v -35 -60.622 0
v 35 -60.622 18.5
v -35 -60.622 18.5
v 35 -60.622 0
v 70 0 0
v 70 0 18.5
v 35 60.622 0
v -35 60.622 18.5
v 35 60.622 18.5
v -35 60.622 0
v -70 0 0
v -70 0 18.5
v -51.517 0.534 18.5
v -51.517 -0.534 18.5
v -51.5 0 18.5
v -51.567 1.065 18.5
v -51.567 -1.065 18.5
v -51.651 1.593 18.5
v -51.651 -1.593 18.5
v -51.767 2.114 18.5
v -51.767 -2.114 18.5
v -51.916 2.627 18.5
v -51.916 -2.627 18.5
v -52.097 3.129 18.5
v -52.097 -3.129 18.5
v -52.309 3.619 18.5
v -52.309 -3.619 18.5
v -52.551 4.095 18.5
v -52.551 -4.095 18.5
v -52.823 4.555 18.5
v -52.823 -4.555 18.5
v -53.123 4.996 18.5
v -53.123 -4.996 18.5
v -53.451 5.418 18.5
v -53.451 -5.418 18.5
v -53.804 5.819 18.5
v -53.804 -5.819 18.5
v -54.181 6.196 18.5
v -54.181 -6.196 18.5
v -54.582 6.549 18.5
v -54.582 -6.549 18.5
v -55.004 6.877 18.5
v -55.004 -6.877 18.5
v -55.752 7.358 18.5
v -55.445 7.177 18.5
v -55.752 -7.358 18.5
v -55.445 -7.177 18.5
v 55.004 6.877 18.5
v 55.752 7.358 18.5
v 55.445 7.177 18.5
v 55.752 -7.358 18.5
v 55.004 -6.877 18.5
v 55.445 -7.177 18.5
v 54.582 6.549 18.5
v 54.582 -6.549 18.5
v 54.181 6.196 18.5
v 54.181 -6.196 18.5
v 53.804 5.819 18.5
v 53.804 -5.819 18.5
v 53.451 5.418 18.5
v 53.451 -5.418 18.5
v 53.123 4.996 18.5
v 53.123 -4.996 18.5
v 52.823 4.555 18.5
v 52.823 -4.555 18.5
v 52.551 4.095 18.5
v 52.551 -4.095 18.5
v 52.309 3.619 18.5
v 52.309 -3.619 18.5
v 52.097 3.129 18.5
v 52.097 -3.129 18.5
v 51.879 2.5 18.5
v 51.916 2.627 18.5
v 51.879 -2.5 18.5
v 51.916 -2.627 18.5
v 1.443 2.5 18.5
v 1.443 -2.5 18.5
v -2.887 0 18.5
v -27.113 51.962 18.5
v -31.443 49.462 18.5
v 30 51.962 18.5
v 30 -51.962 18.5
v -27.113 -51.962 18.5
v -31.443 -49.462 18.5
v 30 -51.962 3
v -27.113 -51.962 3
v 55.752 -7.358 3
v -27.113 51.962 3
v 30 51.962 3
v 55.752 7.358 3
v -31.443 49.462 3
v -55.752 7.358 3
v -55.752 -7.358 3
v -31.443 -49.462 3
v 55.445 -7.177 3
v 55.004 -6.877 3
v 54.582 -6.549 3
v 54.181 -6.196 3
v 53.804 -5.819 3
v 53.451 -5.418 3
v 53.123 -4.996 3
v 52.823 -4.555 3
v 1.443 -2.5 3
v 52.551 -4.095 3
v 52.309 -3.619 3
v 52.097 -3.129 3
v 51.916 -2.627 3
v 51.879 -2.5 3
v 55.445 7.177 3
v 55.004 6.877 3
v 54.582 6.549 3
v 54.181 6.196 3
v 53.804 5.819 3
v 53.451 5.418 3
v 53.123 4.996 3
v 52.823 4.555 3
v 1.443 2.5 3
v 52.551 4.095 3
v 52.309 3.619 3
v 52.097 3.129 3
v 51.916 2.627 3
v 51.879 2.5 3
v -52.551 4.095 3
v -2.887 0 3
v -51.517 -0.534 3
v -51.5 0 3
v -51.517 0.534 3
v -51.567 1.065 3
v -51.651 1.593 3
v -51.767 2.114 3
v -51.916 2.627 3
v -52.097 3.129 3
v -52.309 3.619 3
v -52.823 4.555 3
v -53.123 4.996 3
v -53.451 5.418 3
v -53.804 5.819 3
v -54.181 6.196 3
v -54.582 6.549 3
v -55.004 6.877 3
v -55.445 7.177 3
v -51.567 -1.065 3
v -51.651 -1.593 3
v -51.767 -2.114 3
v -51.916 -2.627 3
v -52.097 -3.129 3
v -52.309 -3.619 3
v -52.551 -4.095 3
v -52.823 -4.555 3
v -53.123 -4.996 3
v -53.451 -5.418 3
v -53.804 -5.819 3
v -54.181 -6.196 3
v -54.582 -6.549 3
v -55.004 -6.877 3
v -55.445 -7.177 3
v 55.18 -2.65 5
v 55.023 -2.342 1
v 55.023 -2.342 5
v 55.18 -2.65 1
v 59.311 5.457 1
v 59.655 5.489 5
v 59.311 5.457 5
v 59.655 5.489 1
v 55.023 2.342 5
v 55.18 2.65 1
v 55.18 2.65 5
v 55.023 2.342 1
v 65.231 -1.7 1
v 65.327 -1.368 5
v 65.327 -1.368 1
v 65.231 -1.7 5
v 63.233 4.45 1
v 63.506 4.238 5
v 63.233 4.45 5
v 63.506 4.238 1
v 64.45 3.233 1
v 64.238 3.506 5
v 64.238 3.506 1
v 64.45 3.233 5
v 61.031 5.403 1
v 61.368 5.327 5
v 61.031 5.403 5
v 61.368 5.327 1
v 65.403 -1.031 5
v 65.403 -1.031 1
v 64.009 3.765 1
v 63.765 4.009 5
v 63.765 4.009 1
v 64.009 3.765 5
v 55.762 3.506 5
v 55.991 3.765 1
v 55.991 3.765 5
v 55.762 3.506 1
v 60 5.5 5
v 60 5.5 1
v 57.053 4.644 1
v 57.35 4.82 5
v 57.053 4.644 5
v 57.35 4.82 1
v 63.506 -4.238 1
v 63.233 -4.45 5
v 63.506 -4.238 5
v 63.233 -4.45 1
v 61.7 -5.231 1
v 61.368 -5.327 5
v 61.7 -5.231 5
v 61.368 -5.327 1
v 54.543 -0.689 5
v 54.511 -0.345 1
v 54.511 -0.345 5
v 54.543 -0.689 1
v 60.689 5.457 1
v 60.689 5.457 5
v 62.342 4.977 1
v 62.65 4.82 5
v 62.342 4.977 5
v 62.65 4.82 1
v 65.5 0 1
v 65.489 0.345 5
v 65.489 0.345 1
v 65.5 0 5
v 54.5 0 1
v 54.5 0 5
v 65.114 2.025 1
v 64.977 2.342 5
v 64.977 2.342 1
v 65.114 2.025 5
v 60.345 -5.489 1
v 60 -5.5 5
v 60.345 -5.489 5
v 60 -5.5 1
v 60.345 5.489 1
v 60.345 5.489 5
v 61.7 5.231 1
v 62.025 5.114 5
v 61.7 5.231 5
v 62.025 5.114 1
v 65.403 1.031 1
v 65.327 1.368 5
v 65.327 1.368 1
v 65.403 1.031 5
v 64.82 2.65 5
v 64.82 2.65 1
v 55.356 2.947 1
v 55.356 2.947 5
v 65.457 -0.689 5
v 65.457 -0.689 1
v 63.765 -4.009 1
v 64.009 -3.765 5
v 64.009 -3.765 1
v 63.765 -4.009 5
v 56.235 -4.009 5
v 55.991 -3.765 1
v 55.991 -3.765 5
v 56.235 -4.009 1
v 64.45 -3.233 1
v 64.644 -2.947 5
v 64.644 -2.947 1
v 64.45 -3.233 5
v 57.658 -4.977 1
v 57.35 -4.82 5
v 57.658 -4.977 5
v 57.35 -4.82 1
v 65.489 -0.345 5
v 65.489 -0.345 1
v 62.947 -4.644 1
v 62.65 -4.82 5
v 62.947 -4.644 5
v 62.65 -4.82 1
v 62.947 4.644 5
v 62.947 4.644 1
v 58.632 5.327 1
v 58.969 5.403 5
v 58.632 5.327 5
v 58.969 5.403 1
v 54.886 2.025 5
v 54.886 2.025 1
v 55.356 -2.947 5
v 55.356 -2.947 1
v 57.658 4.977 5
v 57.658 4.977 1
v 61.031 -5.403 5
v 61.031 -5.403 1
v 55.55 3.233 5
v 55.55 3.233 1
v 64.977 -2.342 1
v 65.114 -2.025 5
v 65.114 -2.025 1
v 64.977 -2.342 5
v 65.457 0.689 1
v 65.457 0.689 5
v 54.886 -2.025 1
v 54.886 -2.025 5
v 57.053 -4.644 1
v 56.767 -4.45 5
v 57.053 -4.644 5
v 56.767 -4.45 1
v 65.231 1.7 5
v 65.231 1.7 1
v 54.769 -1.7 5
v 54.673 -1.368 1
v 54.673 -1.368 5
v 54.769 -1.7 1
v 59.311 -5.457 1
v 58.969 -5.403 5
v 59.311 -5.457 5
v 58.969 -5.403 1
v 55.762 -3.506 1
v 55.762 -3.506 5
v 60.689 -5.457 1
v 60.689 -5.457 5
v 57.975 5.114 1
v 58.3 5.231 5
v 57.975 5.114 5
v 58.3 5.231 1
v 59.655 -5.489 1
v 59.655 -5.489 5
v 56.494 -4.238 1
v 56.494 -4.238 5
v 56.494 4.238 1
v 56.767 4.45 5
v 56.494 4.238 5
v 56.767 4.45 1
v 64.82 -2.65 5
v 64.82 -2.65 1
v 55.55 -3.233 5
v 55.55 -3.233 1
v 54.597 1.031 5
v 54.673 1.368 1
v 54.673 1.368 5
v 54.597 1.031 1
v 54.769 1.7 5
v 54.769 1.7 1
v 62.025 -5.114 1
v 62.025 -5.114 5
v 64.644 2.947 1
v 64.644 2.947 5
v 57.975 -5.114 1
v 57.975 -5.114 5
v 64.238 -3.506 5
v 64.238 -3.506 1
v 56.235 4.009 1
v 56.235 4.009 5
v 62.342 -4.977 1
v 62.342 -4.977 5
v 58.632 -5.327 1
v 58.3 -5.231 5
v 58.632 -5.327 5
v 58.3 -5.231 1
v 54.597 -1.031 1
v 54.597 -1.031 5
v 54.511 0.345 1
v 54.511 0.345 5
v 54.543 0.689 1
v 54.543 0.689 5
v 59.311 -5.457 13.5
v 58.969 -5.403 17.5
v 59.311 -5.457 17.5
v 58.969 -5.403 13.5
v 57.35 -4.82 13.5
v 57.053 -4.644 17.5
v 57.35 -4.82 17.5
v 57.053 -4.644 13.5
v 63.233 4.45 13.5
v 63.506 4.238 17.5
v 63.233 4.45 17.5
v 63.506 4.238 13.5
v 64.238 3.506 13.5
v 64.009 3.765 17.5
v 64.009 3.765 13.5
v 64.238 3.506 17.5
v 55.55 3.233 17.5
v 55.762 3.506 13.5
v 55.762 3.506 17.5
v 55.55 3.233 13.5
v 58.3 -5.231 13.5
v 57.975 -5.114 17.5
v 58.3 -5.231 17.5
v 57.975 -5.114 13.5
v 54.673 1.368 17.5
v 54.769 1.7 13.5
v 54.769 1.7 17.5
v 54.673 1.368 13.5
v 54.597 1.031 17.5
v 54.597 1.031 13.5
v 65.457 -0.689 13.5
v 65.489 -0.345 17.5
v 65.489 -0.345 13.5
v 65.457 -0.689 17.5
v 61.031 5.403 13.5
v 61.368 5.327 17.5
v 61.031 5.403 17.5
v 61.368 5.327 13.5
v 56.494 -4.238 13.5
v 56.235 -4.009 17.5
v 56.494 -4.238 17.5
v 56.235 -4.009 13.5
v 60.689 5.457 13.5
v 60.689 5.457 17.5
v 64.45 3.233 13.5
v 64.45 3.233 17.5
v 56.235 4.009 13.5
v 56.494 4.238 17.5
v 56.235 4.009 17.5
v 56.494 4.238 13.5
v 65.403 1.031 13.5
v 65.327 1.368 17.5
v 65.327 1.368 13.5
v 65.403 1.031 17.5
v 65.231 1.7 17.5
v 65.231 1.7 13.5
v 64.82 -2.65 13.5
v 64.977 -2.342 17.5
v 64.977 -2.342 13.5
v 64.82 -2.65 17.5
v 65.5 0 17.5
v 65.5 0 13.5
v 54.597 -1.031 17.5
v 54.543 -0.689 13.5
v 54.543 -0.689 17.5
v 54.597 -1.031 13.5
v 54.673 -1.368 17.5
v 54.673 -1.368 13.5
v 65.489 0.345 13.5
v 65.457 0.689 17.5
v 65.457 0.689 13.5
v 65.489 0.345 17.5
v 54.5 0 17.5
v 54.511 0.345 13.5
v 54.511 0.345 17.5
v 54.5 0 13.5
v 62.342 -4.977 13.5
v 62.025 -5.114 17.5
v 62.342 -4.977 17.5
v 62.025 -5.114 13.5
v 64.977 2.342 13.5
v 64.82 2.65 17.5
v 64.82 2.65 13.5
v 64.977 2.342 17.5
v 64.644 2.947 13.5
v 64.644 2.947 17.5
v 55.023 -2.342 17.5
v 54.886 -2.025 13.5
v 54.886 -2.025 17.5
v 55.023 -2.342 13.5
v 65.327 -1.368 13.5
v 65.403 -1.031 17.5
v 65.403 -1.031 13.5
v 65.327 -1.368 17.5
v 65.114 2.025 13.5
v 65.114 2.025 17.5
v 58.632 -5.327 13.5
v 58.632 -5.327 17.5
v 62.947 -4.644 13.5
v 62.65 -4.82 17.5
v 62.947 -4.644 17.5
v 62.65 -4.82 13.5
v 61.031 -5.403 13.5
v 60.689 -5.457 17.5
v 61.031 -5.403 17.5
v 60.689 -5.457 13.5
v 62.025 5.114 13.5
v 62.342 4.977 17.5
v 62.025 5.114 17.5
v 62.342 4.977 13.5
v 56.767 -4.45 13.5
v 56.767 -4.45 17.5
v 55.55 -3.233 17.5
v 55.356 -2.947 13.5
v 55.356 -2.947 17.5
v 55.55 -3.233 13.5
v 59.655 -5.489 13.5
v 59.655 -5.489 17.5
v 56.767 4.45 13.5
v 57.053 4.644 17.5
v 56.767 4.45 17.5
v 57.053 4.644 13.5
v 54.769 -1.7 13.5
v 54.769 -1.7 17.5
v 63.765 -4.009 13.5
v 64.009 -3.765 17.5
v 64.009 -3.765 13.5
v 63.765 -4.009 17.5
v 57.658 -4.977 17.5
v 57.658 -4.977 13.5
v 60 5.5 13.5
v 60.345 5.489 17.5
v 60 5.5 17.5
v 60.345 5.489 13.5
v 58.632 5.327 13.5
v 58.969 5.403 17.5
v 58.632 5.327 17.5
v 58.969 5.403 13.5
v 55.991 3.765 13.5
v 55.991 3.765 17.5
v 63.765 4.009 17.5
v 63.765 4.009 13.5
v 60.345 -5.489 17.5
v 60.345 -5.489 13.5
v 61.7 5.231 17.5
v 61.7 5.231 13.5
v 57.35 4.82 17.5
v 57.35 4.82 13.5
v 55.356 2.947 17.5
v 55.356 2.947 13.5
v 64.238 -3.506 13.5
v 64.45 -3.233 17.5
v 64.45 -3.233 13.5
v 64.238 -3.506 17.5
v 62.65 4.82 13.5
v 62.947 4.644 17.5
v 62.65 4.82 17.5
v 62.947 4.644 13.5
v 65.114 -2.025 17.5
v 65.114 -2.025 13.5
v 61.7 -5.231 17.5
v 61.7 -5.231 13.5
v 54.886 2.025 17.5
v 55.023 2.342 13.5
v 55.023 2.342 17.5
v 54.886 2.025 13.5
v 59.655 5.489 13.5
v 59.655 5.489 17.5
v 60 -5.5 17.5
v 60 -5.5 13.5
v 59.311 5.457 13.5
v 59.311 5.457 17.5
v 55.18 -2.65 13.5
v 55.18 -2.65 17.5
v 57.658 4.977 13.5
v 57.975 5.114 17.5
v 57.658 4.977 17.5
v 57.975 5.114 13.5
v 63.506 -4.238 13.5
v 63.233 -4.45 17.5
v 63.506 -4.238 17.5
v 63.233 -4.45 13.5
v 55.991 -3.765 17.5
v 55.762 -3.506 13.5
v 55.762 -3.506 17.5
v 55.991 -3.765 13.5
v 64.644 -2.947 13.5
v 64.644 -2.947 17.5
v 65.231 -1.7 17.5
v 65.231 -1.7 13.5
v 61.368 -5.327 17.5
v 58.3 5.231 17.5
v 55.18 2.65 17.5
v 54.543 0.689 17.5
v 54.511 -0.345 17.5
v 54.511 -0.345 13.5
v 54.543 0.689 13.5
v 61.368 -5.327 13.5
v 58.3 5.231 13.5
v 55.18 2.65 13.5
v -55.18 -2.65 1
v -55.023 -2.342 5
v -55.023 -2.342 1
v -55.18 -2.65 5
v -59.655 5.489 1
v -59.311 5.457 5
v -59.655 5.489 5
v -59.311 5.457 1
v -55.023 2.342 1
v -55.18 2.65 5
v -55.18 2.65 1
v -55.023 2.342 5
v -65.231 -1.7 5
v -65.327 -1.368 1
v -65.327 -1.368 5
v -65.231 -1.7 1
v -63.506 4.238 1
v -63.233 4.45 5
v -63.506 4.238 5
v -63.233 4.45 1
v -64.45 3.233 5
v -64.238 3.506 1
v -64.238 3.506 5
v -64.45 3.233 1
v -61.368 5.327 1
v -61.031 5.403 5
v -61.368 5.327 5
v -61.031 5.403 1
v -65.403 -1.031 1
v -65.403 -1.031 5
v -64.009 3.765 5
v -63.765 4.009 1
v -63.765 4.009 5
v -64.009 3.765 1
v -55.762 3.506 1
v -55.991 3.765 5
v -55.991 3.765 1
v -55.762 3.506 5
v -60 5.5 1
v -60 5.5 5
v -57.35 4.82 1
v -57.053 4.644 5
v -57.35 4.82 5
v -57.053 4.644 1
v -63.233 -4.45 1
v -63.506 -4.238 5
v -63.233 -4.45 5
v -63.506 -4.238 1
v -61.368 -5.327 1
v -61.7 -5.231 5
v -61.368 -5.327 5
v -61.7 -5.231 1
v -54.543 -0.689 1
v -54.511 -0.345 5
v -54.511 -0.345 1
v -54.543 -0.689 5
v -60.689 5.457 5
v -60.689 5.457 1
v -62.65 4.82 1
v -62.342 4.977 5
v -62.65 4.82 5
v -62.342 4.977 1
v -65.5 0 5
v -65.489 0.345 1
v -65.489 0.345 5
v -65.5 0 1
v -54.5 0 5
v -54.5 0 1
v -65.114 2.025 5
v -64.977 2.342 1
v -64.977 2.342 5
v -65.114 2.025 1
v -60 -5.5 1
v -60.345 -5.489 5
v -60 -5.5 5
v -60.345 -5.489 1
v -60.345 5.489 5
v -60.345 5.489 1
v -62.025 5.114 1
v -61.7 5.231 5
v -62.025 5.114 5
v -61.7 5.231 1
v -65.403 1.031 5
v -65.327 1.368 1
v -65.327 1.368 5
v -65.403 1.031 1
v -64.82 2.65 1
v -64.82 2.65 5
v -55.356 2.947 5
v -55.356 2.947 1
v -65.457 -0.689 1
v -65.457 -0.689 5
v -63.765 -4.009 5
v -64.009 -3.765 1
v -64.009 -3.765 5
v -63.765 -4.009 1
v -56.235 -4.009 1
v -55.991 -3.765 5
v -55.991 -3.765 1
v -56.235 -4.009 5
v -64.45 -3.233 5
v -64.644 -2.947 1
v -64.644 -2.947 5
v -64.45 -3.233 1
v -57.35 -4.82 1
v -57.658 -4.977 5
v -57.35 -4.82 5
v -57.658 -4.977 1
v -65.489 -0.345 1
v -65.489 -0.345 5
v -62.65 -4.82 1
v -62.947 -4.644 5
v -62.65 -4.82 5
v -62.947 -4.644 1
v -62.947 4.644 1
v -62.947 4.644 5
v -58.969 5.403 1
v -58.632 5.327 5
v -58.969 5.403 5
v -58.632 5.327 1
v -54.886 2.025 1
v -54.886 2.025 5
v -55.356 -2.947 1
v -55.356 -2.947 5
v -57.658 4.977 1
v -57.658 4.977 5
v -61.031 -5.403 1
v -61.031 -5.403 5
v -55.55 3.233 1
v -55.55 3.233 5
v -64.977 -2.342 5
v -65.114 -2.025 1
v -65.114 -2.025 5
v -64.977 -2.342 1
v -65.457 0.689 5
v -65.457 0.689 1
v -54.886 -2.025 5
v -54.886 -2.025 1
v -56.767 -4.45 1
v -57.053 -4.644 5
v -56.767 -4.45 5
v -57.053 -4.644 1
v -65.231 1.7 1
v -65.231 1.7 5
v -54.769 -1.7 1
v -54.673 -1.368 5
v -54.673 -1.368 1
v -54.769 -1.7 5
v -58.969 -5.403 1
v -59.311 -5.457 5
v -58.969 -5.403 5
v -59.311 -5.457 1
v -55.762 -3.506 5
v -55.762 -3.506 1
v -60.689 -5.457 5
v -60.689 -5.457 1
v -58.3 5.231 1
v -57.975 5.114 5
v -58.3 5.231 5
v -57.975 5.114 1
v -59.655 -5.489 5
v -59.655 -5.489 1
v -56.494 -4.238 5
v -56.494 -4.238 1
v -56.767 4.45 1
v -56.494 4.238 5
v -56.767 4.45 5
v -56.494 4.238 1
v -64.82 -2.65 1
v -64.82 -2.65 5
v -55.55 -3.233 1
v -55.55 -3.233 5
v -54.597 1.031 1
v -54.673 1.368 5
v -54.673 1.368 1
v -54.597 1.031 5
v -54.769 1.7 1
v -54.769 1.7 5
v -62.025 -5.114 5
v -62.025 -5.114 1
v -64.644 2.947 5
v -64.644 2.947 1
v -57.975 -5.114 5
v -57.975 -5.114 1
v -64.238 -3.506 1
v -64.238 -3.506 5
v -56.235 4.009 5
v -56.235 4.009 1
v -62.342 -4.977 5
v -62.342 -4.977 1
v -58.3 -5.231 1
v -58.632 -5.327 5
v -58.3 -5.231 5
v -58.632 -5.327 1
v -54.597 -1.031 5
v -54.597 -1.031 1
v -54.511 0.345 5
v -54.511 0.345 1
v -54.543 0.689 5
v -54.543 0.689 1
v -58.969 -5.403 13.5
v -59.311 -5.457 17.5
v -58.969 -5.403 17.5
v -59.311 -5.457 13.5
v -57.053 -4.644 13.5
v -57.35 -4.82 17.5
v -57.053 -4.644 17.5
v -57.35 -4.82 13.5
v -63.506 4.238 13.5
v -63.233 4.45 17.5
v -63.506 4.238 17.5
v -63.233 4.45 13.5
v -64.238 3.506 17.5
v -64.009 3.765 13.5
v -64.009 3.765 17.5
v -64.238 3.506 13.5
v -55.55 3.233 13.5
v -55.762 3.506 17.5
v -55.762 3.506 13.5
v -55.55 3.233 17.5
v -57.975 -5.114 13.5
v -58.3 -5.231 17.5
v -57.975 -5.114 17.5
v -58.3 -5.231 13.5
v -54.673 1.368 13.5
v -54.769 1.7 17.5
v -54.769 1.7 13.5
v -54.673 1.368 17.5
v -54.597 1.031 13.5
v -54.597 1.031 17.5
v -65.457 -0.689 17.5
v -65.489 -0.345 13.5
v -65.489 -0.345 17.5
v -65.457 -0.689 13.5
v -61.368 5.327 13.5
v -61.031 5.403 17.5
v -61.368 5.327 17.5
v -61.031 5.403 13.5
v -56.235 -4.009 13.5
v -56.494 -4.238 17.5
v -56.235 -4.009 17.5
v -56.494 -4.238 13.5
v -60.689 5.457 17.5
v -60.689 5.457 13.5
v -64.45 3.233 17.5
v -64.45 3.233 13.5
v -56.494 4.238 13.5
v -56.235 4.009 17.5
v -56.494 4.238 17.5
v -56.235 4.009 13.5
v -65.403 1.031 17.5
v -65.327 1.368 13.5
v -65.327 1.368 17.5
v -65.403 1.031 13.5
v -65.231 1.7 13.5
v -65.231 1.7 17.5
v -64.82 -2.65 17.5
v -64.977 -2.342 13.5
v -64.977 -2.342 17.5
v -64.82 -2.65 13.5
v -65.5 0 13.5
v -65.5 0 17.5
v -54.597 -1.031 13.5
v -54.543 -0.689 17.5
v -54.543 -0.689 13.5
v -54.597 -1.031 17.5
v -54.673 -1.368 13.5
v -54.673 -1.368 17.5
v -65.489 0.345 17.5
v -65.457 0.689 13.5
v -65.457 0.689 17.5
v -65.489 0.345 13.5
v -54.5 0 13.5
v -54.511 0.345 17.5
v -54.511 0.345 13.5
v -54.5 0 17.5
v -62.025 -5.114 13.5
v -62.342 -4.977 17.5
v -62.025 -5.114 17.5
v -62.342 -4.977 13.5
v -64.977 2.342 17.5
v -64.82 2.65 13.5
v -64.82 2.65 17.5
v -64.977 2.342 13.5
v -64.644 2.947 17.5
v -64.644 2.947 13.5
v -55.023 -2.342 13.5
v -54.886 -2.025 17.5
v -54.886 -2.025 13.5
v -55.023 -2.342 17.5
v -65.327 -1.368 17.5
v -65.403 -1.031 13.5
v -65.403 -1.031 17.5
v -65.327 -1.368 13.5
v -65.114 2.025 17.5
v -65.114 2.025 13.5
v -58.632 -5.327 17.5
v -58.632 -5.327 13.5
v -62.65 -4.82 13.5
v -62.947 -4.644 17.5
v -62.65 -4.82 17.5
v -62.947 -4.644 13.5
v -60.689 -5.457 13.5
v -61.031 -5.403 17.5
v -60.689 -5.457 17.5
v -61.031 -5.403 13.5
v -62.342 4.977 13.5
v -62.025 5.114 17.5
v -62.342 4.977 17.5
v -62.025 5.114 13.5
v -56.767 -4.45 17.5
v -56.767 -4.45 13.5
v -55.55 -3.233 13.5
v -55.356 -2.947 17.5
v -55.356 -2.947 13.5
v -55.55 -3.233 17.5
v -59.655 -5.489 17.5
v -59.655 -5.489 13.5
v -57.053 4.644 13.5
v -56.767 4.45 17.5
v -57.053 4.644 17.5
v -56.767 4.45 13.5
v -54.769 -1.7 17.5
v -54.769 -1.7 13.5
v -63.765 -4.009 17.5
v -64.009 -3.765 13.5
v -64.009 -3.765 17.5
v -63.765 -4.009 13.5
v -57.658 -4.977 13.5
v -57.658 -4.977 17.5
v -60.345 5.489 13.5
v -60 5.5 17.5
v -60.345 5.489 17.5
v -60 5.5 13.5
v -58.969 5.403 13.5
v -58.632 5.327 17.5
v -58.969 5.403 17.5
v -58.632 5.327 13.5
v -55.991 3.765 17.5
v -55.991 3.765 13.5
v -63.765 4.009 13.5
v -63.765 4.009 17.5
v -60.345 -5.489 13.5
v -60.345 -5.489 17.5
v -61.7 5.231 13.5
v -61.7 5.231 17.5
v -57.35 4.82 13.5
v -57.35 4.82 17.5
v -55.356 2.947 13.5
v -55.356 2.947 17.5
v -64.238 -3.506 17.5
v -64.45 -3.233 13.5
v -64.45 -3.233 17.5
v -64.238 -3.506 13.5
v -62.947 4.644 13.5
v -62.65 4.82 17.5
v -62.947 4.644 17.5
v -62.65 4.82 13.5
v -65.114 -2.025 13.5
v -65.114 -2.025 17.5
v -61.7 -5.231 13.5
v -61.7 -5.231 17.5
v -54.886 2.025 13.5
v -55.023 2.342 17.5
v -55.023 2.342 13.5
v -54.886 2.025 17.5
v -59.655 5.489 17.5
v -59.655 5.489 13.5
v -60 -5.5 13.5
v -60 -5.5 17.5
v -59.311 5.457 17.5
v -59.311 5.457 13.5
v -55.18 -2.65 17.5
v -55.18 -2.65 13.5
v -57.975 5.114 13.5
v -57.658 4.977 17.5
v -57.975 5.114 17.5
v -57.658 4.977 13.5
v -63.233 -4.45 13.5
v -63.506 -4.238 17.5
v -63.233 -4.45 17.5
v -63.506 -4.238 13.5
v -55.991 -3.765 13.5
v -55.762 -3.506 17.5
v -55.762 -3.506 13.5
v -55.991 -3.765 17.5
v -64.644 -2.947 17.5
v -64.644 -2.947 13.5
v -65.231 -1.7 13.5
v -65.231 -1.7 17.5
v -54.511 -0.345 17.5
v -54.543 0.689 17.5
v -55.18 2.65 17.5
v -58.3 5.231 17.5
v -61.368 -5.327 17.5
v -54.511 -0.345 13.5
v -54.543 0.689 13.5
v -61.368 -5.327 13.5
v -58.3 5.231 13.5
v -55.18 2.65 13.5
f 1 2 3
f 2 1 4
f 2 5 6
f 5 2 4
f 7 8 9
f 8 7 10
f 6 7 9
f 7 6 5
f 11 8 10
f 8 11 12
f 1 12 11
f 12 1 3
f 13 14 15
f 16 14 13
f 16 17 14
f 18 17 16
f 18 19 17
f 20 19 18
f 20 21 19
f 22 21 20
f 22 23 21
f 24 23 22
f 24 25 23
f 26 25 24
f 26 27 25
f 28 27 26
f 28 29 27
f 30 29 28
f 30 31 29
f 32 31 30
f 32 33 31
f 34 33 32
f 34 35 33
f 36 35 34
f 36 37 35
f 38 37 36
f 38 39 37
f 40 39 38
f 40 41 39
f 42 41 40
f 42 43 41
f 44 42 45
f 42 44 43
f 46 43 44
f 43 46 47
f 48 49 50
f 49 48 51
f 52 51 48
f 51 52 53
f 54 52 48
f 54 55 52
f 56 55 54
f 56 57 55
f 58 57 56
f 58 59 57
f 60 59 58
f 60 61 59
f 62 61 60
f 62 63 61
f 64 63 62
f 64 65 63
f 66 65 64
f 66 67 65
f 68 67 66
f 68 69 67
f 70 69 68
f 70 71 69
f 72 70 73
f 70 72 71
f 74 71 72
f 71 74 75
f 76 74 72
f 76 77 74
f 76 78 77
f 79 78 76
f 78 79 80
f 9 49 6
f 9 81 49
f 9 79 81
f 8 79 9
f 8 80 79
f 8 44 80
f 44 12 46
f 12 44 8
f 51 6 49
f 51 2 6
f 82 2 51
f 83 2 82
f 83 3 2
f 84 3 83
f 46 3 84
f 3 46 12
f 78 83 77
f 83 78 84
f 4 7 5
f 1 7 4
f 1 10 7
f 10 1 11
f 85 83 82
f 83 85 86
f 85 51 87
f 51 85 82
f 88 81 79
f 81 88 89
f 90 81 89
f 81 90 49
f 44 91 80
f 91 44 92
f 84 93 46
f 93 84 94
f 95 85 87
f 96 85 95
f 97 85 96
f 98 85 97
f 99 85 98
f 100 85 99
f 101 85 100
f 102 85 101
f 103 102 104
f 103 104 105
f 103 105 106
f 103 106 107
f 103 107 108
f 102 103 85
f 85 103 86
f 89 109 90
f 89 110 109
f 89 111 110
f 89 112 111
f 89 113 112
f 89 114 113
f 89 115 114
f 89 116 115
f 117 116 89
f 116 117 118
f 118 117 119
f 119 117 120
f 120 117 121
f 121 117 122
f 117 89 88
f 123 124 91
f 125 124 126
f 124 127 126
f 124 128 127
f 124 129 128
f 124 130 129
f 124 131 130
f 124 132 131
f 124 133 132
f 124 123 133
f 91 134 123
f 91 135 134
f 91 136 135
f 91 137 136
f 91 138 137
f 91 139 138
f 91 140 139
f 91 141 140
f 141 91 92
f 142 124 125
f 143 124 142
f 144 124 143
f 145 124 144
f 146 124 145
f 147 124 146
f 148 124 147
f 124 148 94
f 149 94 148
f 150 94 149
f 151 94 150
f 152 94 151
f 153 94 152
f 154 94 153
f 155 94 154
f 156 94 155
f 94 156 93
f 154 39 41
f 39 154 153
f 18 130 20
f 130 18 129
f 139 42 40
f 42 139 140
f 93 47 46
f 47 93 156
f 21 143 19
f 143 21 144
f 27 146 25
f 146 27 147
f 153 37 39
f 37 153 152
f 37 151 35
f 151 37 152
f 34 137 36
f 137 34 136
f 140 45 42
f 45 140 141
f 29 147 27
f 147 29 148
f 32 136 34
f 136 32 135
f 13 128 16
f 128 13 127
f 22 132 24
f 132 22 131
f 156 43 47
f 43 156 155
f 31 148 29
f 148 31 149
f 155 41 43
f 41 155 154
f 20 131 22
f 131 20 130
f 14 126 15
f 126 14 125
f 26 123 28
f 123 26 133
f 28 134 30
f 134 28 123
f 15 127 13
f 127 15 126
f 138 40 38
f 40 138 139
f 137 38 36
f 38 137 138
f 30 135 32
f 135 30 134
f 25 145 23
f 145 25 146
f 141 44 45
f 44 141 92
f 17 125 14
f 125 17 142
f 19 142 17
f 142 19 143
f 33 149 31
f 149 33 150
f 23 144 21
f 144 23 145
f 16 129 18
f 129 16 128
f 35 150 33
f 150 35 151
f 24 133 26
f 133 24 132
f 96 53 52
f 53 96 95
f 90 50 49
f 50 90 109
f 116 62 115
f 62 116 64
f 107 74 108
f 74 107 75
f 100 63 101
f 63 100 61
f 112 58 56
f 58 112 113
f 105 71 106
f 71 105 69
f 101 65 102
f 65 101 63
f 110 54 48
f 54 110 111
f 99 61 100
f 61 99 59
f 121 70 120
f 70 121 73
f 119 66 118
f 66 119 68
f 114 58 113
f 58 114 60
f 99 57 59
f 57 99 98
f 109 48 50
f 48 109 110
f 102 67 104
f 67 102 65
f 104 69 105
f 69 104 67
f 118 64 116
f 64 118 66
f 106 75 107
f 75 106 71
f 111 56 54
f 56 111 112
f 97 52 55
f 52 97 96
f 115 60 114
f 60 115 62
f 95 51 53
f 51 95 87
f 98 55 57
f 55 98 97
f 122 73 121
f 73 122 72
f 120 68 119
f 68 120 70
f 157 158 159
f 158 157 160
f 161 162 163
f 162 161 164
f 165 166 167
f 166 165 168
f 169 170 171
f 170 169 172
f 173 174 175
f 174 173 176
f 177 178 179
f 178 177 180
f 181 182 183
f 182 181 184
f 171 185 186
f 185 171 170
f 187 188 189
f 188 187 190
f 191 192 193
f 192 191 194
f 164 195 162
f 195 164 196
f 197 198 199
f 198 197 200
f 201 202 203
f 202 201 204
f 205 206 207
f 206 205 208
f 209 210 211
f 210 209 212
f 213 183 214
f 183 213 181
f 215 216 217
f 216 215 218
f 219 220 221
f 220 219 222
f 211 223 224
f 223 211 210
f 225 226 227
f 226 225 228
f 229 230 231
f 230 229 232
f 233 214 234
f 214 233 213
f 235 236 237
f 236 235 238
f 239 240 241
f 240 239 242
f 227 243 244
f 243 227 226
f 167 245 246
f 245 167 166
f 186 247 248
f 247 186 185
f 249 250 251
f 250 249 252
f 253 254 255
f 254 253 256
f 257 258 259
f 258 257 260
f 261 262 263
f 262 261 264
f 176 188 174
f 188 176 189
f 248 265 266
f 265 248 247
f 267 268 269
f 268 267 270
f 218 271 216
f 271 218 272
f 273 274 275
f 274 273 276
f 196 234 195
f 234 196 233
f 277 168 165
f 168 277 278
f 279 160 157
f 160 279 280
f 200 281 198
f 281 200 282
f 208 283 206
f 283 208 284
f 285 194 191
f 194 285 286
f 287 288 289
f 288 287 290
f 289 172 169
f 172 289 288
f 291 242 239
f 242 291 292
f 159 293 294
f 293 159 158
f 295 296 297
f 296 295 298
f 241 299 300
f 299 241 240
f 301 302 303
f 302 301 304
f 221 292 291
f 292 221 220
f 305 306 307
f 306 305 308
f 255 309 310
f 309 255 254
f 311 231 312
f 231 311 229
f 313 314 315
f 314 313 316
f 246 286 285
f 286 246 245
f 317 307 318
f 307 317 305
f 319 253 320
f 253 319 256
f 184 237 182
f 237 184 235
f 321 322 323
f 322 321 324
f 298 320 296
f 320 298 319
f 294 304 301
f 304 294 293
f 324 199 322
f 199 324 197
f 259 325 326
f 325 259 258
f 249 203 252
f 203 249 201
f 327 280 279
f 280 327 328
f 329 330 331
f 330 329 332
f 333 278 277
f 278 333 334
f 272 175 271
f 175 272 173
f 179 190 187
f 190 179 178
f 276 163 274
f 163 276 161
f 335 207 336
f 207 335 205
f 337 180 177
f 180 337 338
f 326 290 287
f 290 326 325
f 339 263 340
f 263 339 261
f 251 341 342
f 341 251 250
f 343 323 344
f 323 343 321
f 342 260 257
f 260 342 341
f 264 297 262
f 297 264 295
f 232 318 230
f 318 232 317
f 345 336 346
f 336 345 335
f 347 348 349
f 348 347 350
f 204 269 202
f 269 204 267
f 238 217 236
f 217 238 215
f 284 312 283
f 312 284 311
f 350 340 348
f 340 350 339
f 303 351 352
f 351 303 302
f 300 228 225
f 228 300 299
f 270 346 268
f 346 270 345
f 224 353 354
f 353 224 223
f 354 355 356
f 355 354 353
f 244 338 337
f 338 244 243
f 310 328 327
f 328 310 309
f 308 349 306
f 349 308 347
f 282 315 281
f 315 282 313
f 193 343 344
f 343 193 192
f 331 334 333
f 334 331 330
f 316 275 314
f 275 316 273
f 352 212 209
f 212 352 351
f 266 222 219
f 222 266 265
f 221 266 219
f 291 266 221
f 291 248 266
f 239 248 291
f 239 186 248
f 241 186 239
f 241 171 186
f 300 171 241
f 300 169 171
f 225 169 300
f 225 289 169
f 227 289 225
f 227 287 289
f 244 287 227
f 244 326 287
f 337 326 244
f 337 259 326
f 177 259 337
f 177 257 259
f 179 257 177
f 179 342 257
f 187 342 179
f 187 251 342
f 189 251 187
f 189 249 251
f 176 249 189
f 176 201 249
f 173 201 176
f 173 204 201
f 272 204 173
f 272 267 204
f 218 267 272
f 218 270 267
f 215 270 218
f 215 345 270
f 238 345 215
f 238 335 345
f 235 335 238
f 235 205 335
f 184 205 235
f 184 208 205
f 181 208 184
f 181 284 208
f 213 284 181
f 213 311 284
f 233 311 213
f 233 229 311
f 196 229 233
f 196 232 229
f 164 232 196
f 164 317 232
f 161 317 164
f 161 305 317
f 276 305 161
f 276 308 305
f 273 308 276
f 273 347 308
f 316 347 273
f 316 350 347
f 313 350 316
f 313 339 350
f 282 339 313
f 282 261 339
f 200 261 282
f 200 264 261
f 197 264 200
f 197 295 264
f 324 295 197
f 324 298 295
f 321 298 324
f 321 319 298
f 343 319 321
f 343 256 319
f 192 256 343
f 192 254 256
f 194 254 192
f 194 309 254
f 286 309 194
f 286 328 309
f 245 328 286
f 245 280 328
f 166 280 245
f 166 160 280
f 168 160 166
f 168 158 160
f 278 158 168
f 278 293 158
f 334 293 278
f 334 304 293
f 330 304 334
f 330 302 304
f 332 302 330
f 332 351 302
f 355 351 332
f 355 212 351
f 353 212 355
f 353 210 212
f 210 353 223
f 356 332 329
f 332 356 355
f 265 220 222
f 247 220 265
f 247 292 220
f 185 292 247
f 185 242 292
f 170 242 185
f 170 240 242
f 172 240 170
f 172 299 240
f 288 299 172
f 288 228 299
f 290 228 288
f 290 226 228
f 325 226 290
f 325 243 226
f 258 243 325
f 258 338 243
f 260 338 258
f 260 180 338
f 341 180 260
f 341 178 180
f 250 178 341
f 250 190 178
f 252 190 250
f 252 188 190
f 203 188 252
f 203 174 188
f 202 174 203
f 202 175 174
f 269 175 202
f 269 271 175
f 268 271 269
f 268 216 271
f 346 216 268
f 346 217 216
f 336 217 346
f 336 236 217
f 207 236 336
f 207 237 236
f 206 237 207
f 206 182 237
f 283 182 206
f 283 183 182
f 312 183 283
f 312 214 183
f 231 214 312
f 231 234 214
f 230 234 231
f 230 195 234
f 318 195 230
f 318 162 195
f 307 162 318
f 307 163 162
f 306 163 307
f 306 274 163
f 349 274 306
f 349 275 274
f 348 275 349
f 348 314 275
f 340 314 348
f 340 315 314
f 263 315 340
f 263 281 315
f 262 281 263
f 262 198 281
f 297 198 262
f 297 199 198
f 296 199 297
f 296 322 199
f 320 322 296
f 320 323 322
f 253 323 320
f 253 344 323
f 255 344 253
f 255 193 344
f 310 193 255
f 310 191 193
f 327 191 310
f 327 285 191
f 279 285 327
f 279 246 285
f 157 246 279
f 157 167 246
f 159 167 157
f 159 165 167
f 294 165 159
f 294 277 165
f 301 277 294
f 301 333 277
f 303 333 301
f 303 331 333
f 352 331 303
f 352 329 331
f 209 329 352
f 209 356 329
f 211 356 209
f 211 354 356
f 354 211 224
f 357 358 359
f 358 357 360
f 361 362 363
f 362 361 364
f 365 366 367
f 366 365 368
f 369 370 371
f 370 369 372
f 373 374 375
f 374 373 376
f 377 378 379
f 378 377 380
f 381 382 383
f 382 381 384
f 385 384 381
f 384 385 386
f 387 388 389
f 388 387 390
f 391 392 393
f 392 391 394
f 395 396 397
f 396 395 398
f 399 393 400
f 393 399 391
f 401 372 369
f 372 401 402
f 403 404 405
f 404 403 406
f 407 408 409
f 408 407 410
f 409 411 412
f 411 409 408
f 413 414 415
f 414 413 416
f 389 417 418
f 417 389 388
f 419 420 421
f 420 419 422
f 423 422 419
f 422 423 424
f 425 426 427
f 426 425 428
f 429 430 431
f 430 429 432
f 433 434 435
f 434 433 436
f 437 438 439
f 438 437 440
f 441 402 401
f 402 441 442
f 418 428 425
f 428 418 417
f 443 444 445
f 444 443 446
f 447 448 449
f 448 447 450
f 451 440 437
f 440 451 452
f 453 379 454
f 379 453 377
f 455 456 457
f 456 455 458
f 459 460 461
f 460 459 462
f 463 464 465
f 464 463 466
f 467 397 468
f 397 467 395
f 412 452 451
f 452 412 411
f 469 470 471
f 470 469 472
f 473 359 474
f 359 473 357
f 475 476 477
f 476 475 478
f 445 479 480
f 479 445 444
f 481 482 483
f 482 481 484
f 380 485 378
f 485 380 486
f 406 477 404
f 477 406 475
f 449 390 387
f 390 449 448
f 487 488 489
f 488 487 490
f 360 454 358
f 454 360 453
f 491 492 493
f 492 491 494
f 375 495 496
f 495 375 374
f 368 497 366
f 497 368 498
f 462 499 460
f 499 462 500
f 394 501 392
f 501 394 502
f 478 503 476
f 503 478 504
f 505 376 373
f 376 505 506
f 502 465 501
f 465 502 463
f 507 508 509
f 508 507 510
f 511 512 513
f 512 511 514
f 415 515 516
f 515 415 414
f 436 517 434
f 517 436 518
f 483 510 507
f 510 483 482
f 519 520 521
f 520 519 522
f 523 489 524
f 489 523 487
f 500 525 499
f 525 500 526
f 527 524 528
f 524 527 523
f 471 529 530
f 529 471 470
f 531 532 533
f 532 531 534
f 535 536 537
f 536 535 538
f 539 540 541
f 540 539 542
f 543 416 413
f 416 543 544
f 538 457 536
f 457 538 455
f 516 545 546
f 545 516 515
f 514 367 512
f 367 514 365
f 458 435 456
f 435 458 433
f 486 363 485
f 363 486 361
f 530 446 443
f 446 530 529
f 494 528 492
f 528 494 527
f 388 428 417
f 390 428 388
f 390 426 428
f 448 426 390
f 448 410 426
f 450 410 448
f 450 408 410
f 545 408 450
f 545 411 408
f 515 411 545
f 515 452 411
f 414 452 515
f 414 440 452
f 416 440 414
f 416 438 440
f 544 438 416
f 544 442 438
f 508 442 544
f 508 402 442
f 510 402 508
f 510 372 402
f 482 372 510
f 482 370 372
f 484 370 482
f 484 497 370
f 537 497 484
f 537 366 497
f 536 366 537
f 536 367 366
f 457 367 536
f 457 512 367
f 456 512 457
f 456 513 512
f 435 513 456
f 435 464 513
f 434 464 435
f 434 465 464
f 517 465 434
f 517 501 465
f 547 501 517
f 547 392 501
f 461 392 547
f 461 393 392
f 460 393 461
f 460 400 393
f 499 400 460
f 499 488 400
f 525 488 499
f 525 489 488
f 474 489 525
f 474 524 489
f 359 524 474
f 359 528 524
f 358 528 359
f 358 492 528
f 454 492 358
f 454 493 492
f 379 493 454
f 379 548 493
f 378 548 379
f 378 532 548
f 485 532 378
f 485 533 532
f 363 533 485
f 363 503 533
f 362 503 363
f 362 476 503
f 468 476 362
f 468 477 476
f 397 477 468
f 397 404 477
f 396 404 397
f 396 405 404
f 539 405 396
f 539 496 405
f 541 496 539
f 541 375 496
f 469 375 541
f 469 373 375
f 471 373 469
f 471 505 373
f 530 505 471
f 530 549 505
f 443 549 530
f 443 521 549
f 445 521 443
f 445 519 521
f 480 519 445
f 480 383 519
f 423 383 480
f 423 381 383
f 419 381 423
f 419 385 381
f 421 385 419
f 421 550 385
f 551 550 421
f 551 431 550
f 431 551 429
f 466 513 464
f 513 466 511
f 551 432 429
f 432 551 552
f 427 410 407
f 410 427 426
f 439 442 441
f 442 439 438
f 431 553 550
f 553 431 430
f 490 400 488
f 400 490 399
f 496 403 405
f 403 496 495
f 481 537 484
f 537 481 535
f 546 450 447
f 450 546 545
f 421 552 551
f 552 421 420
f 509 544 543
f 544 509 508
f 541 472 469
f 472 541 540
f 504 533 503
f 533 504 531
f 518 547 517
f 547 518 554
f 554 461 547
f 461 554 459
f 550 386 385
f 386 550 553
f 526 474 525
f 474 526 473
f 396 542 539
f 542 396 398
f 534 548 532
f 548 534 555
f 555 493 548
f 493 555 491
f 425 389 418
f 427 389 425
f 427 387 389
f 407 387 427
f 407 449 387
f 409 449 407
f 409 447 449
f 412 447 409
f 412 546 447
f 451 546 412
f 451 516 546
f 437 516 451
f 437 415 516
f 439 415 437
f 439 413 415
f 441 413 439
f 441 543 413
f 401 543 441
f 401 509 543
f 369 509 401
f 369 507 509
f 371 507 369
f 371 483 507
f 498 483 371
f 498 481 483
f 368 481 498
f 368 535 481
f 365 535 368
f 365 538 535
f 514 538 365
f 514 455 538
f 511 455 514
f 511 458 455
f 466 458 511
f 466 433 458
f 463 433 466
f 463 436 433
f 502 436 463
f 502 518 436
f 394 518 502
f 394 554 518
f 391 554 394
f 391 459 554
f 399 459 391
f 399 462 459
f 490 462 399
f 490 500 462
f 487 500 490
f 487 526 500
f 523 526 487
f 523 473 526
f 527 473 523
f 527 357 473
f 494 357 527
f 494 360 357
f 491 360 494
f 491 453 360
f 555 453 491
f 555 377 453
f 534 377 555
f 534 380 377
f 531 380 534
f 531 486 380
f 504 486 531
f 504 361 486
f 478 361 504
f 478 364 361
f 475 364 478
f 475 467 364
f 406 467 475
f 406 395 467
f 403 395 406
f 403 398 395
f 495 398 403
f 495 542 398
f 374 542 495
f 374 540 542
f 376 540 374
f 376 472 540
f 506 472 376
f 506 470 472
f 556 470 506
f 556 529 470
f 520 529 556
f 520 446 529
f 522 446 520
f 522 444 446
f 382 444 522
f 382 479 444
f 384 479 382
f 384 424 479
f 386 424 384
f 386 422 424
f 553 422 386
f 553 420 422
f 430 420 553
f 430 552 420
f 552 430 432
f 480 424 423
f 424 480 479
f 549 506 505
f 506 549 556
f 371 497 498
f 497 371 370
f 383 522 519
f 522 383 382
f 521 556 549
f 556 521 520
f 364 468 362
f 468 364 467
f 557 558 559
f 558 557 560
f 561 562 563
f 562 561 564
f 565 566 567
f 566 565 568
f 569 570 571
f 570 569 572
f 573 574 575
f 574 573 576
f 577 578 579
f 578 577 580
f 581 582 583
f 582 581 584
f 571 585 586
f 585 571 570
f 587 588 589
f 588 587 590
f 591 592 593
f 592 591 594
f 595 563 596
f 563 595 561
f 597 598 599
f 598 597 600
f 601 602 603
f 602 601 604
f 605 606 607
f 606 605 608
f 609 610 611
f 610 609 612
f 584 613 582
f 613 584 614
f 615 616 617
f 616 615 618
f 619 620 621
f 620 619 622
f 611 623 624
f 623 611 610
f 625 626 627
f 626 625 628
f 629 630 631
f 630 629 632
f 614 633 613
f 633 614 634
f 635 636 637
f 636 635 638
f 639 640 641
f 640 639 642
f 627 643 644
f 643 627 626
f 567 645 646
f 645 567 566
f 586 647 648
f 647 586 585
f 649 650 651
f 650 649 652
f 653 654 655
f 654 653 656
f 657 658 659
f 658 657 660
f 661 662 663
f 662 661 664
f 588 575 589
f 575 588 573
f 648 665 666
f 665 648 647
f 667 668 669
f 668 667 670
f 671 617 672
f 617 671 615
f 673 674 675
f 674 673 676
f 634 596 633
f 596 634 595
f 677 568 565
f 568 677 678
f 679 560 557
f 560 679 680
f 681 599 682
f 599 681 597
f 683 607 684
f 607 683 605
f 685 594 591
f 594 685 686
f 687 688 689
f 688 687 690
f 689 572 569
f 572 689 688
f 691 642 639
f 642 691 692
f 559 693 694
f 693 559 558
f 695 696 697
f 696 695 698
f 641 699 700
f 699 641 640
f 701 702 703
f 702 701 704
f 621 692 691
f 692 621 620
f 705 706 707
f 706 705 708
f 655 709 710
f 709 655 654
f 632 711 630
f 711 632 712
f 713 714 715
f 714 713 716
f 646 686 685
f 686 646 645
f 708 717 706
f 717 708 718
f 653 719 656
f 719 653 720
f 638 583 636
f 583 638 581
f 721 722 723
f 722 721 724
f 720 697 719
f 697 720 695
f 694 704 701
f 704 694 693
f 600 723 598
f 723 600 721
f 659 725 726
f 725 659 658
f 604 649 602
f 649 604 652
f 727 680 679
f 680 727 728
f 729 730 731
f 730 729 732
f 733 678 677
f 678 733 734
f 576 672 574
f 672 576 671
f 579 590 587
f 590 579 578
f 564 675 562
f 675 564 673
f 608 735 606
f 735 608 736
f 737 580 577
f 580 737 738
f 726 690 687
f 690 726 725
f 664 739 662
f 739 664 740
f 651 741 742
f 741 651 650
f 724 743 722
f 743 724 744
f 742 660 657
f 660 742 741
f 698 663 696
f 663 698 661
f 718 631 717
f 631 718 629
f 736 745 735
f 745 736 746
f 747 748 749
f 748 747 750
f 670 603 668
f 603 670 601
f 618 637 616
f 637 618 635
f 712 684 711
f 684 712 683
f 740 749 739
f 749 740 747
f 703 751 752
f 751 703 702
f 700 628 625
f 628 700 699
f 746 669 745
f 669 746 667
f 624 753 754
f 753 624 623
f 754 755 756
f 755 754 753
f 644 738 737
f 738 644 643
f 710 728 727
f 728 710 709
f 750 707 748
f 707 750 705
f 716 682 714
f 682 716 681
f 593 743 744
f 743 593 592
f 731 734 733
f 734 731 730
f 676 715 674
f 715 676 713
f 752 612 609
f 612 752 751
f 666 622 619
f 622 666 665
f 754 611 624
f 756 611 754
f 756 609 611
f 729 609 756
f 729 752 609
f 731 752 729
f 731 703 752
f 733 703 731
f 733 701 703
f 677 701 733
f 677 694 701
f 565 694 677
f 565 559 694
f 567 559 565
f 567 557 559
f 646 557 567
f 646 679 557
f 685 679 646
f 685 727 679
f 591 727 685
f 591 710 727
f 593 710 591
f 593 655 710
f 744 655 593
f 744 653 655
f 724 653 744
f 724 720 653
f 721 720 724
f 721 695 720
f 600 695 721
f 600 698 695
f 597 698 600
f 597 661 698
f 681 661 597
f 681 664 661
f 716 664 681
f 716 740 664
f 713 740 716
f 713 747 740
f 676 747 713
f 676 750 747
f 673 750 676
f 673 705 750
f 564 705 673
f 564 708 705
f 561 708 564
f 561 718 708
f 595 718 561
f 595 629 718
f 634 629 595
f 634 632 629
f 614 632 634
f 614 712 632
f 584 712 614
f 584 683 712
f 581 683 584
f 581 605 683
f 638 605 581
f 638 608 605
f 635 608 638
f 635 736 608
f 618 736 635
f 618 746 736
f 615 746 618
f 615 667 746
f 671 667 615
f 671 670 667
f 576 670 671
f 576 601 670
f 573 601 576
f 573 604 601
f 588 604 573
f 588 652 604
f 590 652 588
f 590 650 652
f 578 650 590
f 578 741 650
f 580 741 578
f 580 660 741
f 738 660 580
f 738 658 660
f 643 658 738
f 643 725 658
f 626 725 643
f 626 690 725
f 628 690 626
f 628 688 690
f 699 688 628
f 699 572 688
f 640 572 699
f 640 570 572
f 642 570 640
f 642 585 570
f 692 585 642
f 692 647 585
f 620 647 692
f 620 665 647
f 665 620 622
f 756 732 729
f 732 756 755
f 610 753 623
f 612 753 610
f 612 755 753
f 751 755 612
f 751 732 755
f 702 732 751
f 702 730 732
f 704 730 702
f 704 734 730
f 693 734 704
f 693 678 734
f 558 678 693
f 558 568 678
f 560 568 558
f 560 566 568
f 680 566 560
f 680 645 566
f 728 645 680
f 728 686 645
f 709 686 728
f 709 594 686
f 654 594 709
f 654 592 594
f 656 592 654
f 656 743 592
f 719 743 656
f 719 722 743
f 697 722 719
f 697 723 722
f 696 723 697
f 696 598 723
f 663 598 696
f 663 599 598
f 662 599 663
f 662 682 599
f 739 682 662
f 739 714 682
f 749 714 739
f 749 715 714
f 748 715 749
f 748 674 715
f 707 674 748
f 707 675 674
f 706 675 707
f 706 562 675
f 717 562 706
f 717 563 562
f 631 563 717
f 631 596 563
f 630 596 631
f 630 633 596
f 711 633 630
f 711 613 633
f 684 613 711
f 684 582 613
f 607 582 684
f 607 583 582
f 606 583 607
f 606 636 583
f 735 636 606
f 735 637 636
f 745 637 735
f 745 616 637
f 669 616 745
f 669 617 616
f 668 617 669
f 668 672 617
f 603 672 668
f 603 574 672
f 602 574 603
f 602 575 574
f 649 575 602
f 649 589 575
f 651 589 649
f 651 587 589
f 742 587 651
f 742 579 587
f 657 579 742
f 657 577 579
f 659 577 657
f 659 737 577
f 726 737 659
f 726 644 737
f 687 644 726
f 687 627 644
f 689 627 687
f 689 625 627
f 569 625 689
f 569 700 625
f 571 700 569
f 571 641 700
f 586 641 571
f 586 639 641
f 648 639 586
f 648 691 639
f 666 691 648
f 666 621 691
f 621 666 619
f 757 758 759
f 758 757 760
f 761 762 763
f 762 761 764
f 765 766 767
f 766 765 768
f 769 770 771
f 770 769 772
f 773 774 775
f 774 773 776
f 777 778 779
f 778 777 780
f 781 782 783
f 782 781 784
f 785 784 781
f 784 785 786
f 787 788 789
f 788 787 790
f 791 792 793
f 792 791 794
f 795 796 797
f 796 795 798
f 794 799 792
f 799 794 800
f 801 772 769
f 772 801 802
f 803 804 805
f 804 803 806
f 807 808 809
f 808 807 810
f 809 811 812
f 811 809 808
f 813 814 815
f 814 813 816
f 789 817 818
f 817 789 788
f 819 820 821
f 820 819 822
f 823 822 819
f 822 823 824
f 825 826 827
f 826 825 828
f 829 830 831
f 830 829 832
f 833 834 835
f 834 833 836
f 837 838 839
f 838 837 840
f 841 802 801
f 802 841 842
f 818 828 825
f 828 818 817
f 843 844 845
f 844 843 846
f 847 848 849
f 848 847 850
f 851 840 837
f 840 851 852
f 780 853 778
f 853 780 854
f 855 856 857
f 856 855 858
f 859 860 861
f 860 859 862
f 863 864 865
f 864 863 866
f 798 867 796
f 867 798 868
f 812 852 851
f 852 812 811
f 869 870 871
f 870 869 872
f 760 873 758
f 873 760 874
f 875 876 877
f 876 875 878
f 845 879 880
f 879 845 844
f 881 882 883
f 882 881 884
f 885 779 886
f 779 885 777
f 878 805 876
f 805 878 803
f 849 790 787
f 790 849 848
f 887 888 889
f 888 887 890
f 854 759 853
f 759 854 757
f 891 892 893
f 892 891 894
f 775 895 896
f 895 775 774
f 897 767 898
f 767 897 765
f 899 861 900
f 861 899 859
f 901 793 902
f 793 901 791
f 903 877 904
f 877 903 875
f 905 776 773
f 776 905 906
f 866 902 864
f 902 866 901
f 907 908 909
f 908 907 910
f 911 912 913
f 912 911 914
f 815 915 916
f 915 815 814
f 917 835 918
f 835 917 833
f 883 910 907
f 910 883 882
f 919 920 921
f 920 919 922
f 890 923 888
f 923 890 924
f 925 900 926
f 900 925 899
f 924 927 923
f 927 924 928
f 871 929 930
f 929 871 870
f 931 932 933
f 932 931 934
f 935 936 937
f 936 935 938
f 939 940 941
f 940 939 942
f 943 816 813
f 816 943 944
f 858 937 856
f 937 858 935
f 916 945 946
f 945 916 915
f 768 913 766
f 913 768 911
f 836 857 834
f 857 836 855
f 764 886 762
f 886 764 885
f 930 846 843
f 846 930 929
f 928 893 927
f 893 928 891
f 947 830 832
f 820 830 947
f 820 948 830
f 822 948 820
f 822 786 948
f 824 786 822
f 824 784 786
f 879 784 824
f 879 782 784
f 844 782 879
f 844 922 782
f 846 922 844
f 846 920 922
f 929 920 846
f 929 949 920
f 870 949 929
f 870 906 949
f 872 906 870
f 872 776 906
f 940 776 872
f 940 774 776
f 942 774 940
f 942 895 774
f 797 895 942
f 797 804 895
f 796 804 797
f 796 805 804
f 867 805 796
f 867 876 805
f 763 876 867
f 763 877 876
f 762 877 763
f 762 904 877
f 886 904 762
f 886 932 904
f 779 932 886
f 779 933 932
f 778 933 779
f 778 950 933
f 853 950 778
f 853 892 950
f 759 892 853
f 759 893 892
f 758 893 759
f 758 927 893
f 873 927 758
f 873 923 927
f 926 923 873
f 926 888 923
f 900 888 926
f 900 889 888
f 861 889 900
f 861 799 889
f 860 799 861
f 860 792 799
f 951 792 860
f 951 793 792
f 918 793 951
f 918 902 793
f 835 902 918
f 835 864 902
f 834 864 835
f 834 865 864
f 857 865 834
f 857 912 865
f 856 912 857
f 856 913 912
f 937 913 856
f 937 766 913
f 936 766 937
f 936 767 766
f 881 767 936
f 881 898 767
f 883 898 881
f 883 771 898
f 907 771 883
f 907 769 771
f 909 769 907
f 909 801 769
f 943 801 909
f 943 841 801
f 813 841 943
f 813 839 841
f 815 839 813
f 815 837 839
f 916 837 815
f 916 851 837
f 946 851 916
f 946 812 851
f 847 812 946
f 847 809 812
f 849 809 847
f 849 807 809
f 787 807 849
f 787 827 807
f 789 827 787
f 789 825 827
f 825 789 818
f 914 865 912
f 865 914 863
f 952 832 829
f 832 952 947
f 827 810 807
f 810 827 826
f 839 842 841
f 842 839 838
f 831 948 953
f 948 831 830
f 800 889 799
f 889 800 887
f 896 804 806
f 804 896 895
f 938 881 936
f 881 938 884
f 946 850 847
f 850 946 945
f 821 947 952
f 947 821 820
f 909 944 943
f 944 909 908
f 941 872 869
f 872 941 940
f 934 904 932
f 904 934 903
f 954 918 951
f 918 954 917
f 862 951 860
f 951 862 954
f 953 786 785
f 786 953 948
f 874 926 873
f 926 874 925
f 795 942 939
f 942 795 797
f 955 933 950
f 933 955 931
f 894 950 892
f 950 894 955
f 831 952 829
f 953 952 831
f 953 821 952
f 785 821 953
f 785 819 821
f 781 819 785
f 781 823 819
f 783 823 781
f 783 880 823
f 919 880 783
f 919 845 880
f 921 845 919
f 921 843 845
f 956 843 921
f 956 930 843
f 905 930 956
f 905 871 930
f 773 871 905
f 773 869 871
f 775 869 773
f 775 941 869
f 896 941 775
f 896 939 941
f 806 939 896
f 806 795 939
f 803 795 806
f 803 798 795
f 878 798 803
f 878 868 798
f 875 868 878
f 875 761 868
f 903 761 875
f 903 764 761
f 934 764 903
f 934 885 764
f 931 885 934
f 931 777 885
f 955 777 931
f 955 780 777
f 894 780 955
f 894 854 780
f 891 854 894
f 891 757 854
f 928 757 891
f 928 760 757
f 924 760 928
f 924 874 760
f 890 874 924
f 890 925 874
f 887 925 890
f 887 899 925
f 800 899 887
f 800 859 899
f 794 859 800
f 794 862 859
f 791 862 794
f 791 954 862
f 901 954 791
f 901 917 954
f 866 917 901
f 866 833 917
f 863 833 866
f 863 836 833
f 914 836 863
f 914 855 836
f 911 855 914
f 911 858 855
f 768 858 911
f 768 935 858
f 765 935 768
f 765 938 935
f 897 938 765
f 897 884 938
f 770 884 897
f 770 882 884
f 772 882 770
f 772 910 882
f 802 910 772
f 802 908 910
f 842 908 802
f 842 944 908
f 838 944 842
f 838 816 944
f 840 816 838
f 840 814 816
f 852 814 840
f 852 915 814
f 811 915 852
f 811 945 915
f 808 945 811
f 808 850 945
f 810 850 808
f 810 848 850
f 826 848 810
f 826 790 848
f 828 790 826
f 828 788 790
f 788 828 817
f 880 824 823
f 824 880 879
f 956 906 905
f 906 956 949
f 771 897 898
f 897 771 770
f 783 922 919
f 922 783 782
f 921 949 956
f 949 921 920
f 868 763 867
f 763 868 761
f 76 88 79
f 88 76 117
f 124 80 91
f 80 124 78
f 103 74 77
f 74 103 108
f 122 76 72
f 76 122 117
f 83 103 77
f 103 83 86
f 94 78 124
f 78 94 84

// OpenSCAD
// file: ../../gospel.scad
/**
 * GOSPEL: George's OpenSCAD Procedural Enhancement Library
 * @author glaza
 *
 * Index:
 *      Translation: x, y, z, xy, xz, yz, xyz (displacement, variation)
 *      Scaling:     sx, sy, sz, sxy, sxz, syz, s (factor, variation)
 *      Rotation:    rx, ry, rz (angle, variation)
 *      Duplication: dx, dy, dz ()
 */

/**
 * Translates the children in the X,Y,Z direction
 * @param d Displacement in X,Y,Z direction
 * @param variation The random variation + or - added to the displacement * 
 *  x      Translate X
 *  y      Translate Y
 *  z      Translate Z
 *  xy     Translate equaly in X and Y
 *  xz     Translate equaly in X and Z
 *  yz     Translate equaly in Y and Z
 *  xyz    Translate equaly in X, Y and Z
 */
module x(dx, variation=0) 
{   
    vx = rands(-variation,variation,1)[0];
    translate([dx+vx,0,0])
    children();
}
module y(dy, variation=0) 
{   
    vy = rands(-variation,variation,1)[0];
    translate([0,dy+vy,0])
    children();
} 
module z(dz, variation=0) 
{   
    vz = rands(-variation,variation,1)[0];
    translate([0,0,dz+vz])
    children();
}
module xy(d, variation=0) 
{   
    x(d, variation)
    y(d, variation)
    children();
}
module yz(d, variation=0) 
{   
    z(d, variation)
    y(d, variation)
    children();
}
module xz(d, variation=0) 
{   
    x(d, variation)
    z(d, variation)
    children();
}
module xyz(d, variation=0) 
{   
    xy(d, variation)
    z(d, variation)
    children();
}

/**
 * Rotates the children around the X axis
 * @param angle Degrees to rotate around the X axis
 * @param variation The random variation + or - added
 *  rx     Rotate around X
 *  ry     Rotate around Y
 *  rz     Rotate around Z
 */
module rx(angle, variation=0) 
{   
    v = rands(-variation,variation,1)[0];
    rotate([angle+v,0,0])
    children();
}
module ry(angle, variation=0) 
{   
    v = rands(-variation,variation,1)[0];
    rotate([0,angle+v,0,0])
    children();
}
module rz(angle, variation=0) 
{   
    v = rands(-variation,variation,1)[0];
    rotate([0,0,angle+v])
    children();
}

/**
 * Duplicates the children across the different planes.
 *      dx: YZ plane, dy: XZ plane, dz: XY plane
 */
module dx() 
{
    mirror([1,0,0])
    children();

    children();
}
module dy() 
{
    mirror([0,1,0])
    children();

    children();
}
module dz() 
{
    mirror([0,0,1])
    children();

    children();
}

/**
 * Mirrors across diferent planes.
 *      mx: YZ plane, my: XZ plane, mz: XY plane
 */
module mx() 
{
    mirror([1,0,0])
    children();
}
module my() 
{
    mirror([0,1,0])
    children();
}
module mz() 
{
    mirror([0,0,1])
    children();
}

/**
 * Scales in different directions
 *      mx: YZ plane, my: XZ plane, mz: XY plane
 */
module sx(factor, variation=0) 
{   
    v = rands(-variation,variation,1)[0];
    scale([factor+v,1,1])
    children();
}
module sy(factor, variation=0) 
{   
    v = rands(-variation,variation,1)[0];
    scale([1,factor+v,1])
    children();
} 
module sz(factor, variation=0) 
{   
    v = rands(-variation,variation,1)[0];
    scale([1,1,factor+v])
    children();
}
module sxy(factor, variation=0) 
{   
    sx(factor, variation)
    sy(factor, variation)
    children();
}
module syz(factor, variation=0) 
{   
    sz(factor, variation)
    sy(factor, variation)
    children();
}
module sxz(d, variation=0) 
{   
    sx(factor, variation)
    sz(factor, variation)
    children();
}
module s(factor, variation=0) 
{   
    sxy(factor, variation)
    sz(factor, variation)
    children();
}

/**
 * Shortcuts
 */
module diff() //does not work
{
    difference()
    {
        children();
    }
}


/**
 * Colours
 */
module red()
{
    color("Red")
    children();
}
module blue()
{
    color("RoyalBlue")
    children();
}
module black()
{
    color("Black")
    children();
}
module white()
{
    color("White")
    children();
}
// main file
include <../../gospel.scad>

$fn = 50;

tolerance = 3;
wall_thickness = 3;
block_depth = 15.5 + wall_thickness;
magnet_depth = 4;
magnet_diameter = 11;
magnet_offset = 1;

difference()
{
    union()
    {
        difference()
        {
            cylinder( h = block_depth,
                      $fn=6,
                      d = 140 );

            z( wall_thickness )
            cylinder( h = block_depth,
                      $fn=6,
                      d = 120 );
        }
        
        dx()
        x( 60 )
        cylinder( h = block_depth,
                  $fn=100,
                  d = magnet_diameter + 2 * wall_thickness );
    }
   
        
    // Magnet holes
    z( block_depth / 2 )
    dx() dz()
    x( 60 )
    z( block_depth / 2 - magnet_depth - magnet_offset )
    cylinder( $fn = 100,
              d = magnet_diameter,
              h = magnet_depth );
    
}



rz( 30 )
x( -2.5 )
cube( [5, 60, block_depth] );

rz( -90 )
x( -2.5 )
cube( [5, 53, block_depth] );

rz( 150 )
x( -2.5 )
cube( [5, 60, block_depth] );
